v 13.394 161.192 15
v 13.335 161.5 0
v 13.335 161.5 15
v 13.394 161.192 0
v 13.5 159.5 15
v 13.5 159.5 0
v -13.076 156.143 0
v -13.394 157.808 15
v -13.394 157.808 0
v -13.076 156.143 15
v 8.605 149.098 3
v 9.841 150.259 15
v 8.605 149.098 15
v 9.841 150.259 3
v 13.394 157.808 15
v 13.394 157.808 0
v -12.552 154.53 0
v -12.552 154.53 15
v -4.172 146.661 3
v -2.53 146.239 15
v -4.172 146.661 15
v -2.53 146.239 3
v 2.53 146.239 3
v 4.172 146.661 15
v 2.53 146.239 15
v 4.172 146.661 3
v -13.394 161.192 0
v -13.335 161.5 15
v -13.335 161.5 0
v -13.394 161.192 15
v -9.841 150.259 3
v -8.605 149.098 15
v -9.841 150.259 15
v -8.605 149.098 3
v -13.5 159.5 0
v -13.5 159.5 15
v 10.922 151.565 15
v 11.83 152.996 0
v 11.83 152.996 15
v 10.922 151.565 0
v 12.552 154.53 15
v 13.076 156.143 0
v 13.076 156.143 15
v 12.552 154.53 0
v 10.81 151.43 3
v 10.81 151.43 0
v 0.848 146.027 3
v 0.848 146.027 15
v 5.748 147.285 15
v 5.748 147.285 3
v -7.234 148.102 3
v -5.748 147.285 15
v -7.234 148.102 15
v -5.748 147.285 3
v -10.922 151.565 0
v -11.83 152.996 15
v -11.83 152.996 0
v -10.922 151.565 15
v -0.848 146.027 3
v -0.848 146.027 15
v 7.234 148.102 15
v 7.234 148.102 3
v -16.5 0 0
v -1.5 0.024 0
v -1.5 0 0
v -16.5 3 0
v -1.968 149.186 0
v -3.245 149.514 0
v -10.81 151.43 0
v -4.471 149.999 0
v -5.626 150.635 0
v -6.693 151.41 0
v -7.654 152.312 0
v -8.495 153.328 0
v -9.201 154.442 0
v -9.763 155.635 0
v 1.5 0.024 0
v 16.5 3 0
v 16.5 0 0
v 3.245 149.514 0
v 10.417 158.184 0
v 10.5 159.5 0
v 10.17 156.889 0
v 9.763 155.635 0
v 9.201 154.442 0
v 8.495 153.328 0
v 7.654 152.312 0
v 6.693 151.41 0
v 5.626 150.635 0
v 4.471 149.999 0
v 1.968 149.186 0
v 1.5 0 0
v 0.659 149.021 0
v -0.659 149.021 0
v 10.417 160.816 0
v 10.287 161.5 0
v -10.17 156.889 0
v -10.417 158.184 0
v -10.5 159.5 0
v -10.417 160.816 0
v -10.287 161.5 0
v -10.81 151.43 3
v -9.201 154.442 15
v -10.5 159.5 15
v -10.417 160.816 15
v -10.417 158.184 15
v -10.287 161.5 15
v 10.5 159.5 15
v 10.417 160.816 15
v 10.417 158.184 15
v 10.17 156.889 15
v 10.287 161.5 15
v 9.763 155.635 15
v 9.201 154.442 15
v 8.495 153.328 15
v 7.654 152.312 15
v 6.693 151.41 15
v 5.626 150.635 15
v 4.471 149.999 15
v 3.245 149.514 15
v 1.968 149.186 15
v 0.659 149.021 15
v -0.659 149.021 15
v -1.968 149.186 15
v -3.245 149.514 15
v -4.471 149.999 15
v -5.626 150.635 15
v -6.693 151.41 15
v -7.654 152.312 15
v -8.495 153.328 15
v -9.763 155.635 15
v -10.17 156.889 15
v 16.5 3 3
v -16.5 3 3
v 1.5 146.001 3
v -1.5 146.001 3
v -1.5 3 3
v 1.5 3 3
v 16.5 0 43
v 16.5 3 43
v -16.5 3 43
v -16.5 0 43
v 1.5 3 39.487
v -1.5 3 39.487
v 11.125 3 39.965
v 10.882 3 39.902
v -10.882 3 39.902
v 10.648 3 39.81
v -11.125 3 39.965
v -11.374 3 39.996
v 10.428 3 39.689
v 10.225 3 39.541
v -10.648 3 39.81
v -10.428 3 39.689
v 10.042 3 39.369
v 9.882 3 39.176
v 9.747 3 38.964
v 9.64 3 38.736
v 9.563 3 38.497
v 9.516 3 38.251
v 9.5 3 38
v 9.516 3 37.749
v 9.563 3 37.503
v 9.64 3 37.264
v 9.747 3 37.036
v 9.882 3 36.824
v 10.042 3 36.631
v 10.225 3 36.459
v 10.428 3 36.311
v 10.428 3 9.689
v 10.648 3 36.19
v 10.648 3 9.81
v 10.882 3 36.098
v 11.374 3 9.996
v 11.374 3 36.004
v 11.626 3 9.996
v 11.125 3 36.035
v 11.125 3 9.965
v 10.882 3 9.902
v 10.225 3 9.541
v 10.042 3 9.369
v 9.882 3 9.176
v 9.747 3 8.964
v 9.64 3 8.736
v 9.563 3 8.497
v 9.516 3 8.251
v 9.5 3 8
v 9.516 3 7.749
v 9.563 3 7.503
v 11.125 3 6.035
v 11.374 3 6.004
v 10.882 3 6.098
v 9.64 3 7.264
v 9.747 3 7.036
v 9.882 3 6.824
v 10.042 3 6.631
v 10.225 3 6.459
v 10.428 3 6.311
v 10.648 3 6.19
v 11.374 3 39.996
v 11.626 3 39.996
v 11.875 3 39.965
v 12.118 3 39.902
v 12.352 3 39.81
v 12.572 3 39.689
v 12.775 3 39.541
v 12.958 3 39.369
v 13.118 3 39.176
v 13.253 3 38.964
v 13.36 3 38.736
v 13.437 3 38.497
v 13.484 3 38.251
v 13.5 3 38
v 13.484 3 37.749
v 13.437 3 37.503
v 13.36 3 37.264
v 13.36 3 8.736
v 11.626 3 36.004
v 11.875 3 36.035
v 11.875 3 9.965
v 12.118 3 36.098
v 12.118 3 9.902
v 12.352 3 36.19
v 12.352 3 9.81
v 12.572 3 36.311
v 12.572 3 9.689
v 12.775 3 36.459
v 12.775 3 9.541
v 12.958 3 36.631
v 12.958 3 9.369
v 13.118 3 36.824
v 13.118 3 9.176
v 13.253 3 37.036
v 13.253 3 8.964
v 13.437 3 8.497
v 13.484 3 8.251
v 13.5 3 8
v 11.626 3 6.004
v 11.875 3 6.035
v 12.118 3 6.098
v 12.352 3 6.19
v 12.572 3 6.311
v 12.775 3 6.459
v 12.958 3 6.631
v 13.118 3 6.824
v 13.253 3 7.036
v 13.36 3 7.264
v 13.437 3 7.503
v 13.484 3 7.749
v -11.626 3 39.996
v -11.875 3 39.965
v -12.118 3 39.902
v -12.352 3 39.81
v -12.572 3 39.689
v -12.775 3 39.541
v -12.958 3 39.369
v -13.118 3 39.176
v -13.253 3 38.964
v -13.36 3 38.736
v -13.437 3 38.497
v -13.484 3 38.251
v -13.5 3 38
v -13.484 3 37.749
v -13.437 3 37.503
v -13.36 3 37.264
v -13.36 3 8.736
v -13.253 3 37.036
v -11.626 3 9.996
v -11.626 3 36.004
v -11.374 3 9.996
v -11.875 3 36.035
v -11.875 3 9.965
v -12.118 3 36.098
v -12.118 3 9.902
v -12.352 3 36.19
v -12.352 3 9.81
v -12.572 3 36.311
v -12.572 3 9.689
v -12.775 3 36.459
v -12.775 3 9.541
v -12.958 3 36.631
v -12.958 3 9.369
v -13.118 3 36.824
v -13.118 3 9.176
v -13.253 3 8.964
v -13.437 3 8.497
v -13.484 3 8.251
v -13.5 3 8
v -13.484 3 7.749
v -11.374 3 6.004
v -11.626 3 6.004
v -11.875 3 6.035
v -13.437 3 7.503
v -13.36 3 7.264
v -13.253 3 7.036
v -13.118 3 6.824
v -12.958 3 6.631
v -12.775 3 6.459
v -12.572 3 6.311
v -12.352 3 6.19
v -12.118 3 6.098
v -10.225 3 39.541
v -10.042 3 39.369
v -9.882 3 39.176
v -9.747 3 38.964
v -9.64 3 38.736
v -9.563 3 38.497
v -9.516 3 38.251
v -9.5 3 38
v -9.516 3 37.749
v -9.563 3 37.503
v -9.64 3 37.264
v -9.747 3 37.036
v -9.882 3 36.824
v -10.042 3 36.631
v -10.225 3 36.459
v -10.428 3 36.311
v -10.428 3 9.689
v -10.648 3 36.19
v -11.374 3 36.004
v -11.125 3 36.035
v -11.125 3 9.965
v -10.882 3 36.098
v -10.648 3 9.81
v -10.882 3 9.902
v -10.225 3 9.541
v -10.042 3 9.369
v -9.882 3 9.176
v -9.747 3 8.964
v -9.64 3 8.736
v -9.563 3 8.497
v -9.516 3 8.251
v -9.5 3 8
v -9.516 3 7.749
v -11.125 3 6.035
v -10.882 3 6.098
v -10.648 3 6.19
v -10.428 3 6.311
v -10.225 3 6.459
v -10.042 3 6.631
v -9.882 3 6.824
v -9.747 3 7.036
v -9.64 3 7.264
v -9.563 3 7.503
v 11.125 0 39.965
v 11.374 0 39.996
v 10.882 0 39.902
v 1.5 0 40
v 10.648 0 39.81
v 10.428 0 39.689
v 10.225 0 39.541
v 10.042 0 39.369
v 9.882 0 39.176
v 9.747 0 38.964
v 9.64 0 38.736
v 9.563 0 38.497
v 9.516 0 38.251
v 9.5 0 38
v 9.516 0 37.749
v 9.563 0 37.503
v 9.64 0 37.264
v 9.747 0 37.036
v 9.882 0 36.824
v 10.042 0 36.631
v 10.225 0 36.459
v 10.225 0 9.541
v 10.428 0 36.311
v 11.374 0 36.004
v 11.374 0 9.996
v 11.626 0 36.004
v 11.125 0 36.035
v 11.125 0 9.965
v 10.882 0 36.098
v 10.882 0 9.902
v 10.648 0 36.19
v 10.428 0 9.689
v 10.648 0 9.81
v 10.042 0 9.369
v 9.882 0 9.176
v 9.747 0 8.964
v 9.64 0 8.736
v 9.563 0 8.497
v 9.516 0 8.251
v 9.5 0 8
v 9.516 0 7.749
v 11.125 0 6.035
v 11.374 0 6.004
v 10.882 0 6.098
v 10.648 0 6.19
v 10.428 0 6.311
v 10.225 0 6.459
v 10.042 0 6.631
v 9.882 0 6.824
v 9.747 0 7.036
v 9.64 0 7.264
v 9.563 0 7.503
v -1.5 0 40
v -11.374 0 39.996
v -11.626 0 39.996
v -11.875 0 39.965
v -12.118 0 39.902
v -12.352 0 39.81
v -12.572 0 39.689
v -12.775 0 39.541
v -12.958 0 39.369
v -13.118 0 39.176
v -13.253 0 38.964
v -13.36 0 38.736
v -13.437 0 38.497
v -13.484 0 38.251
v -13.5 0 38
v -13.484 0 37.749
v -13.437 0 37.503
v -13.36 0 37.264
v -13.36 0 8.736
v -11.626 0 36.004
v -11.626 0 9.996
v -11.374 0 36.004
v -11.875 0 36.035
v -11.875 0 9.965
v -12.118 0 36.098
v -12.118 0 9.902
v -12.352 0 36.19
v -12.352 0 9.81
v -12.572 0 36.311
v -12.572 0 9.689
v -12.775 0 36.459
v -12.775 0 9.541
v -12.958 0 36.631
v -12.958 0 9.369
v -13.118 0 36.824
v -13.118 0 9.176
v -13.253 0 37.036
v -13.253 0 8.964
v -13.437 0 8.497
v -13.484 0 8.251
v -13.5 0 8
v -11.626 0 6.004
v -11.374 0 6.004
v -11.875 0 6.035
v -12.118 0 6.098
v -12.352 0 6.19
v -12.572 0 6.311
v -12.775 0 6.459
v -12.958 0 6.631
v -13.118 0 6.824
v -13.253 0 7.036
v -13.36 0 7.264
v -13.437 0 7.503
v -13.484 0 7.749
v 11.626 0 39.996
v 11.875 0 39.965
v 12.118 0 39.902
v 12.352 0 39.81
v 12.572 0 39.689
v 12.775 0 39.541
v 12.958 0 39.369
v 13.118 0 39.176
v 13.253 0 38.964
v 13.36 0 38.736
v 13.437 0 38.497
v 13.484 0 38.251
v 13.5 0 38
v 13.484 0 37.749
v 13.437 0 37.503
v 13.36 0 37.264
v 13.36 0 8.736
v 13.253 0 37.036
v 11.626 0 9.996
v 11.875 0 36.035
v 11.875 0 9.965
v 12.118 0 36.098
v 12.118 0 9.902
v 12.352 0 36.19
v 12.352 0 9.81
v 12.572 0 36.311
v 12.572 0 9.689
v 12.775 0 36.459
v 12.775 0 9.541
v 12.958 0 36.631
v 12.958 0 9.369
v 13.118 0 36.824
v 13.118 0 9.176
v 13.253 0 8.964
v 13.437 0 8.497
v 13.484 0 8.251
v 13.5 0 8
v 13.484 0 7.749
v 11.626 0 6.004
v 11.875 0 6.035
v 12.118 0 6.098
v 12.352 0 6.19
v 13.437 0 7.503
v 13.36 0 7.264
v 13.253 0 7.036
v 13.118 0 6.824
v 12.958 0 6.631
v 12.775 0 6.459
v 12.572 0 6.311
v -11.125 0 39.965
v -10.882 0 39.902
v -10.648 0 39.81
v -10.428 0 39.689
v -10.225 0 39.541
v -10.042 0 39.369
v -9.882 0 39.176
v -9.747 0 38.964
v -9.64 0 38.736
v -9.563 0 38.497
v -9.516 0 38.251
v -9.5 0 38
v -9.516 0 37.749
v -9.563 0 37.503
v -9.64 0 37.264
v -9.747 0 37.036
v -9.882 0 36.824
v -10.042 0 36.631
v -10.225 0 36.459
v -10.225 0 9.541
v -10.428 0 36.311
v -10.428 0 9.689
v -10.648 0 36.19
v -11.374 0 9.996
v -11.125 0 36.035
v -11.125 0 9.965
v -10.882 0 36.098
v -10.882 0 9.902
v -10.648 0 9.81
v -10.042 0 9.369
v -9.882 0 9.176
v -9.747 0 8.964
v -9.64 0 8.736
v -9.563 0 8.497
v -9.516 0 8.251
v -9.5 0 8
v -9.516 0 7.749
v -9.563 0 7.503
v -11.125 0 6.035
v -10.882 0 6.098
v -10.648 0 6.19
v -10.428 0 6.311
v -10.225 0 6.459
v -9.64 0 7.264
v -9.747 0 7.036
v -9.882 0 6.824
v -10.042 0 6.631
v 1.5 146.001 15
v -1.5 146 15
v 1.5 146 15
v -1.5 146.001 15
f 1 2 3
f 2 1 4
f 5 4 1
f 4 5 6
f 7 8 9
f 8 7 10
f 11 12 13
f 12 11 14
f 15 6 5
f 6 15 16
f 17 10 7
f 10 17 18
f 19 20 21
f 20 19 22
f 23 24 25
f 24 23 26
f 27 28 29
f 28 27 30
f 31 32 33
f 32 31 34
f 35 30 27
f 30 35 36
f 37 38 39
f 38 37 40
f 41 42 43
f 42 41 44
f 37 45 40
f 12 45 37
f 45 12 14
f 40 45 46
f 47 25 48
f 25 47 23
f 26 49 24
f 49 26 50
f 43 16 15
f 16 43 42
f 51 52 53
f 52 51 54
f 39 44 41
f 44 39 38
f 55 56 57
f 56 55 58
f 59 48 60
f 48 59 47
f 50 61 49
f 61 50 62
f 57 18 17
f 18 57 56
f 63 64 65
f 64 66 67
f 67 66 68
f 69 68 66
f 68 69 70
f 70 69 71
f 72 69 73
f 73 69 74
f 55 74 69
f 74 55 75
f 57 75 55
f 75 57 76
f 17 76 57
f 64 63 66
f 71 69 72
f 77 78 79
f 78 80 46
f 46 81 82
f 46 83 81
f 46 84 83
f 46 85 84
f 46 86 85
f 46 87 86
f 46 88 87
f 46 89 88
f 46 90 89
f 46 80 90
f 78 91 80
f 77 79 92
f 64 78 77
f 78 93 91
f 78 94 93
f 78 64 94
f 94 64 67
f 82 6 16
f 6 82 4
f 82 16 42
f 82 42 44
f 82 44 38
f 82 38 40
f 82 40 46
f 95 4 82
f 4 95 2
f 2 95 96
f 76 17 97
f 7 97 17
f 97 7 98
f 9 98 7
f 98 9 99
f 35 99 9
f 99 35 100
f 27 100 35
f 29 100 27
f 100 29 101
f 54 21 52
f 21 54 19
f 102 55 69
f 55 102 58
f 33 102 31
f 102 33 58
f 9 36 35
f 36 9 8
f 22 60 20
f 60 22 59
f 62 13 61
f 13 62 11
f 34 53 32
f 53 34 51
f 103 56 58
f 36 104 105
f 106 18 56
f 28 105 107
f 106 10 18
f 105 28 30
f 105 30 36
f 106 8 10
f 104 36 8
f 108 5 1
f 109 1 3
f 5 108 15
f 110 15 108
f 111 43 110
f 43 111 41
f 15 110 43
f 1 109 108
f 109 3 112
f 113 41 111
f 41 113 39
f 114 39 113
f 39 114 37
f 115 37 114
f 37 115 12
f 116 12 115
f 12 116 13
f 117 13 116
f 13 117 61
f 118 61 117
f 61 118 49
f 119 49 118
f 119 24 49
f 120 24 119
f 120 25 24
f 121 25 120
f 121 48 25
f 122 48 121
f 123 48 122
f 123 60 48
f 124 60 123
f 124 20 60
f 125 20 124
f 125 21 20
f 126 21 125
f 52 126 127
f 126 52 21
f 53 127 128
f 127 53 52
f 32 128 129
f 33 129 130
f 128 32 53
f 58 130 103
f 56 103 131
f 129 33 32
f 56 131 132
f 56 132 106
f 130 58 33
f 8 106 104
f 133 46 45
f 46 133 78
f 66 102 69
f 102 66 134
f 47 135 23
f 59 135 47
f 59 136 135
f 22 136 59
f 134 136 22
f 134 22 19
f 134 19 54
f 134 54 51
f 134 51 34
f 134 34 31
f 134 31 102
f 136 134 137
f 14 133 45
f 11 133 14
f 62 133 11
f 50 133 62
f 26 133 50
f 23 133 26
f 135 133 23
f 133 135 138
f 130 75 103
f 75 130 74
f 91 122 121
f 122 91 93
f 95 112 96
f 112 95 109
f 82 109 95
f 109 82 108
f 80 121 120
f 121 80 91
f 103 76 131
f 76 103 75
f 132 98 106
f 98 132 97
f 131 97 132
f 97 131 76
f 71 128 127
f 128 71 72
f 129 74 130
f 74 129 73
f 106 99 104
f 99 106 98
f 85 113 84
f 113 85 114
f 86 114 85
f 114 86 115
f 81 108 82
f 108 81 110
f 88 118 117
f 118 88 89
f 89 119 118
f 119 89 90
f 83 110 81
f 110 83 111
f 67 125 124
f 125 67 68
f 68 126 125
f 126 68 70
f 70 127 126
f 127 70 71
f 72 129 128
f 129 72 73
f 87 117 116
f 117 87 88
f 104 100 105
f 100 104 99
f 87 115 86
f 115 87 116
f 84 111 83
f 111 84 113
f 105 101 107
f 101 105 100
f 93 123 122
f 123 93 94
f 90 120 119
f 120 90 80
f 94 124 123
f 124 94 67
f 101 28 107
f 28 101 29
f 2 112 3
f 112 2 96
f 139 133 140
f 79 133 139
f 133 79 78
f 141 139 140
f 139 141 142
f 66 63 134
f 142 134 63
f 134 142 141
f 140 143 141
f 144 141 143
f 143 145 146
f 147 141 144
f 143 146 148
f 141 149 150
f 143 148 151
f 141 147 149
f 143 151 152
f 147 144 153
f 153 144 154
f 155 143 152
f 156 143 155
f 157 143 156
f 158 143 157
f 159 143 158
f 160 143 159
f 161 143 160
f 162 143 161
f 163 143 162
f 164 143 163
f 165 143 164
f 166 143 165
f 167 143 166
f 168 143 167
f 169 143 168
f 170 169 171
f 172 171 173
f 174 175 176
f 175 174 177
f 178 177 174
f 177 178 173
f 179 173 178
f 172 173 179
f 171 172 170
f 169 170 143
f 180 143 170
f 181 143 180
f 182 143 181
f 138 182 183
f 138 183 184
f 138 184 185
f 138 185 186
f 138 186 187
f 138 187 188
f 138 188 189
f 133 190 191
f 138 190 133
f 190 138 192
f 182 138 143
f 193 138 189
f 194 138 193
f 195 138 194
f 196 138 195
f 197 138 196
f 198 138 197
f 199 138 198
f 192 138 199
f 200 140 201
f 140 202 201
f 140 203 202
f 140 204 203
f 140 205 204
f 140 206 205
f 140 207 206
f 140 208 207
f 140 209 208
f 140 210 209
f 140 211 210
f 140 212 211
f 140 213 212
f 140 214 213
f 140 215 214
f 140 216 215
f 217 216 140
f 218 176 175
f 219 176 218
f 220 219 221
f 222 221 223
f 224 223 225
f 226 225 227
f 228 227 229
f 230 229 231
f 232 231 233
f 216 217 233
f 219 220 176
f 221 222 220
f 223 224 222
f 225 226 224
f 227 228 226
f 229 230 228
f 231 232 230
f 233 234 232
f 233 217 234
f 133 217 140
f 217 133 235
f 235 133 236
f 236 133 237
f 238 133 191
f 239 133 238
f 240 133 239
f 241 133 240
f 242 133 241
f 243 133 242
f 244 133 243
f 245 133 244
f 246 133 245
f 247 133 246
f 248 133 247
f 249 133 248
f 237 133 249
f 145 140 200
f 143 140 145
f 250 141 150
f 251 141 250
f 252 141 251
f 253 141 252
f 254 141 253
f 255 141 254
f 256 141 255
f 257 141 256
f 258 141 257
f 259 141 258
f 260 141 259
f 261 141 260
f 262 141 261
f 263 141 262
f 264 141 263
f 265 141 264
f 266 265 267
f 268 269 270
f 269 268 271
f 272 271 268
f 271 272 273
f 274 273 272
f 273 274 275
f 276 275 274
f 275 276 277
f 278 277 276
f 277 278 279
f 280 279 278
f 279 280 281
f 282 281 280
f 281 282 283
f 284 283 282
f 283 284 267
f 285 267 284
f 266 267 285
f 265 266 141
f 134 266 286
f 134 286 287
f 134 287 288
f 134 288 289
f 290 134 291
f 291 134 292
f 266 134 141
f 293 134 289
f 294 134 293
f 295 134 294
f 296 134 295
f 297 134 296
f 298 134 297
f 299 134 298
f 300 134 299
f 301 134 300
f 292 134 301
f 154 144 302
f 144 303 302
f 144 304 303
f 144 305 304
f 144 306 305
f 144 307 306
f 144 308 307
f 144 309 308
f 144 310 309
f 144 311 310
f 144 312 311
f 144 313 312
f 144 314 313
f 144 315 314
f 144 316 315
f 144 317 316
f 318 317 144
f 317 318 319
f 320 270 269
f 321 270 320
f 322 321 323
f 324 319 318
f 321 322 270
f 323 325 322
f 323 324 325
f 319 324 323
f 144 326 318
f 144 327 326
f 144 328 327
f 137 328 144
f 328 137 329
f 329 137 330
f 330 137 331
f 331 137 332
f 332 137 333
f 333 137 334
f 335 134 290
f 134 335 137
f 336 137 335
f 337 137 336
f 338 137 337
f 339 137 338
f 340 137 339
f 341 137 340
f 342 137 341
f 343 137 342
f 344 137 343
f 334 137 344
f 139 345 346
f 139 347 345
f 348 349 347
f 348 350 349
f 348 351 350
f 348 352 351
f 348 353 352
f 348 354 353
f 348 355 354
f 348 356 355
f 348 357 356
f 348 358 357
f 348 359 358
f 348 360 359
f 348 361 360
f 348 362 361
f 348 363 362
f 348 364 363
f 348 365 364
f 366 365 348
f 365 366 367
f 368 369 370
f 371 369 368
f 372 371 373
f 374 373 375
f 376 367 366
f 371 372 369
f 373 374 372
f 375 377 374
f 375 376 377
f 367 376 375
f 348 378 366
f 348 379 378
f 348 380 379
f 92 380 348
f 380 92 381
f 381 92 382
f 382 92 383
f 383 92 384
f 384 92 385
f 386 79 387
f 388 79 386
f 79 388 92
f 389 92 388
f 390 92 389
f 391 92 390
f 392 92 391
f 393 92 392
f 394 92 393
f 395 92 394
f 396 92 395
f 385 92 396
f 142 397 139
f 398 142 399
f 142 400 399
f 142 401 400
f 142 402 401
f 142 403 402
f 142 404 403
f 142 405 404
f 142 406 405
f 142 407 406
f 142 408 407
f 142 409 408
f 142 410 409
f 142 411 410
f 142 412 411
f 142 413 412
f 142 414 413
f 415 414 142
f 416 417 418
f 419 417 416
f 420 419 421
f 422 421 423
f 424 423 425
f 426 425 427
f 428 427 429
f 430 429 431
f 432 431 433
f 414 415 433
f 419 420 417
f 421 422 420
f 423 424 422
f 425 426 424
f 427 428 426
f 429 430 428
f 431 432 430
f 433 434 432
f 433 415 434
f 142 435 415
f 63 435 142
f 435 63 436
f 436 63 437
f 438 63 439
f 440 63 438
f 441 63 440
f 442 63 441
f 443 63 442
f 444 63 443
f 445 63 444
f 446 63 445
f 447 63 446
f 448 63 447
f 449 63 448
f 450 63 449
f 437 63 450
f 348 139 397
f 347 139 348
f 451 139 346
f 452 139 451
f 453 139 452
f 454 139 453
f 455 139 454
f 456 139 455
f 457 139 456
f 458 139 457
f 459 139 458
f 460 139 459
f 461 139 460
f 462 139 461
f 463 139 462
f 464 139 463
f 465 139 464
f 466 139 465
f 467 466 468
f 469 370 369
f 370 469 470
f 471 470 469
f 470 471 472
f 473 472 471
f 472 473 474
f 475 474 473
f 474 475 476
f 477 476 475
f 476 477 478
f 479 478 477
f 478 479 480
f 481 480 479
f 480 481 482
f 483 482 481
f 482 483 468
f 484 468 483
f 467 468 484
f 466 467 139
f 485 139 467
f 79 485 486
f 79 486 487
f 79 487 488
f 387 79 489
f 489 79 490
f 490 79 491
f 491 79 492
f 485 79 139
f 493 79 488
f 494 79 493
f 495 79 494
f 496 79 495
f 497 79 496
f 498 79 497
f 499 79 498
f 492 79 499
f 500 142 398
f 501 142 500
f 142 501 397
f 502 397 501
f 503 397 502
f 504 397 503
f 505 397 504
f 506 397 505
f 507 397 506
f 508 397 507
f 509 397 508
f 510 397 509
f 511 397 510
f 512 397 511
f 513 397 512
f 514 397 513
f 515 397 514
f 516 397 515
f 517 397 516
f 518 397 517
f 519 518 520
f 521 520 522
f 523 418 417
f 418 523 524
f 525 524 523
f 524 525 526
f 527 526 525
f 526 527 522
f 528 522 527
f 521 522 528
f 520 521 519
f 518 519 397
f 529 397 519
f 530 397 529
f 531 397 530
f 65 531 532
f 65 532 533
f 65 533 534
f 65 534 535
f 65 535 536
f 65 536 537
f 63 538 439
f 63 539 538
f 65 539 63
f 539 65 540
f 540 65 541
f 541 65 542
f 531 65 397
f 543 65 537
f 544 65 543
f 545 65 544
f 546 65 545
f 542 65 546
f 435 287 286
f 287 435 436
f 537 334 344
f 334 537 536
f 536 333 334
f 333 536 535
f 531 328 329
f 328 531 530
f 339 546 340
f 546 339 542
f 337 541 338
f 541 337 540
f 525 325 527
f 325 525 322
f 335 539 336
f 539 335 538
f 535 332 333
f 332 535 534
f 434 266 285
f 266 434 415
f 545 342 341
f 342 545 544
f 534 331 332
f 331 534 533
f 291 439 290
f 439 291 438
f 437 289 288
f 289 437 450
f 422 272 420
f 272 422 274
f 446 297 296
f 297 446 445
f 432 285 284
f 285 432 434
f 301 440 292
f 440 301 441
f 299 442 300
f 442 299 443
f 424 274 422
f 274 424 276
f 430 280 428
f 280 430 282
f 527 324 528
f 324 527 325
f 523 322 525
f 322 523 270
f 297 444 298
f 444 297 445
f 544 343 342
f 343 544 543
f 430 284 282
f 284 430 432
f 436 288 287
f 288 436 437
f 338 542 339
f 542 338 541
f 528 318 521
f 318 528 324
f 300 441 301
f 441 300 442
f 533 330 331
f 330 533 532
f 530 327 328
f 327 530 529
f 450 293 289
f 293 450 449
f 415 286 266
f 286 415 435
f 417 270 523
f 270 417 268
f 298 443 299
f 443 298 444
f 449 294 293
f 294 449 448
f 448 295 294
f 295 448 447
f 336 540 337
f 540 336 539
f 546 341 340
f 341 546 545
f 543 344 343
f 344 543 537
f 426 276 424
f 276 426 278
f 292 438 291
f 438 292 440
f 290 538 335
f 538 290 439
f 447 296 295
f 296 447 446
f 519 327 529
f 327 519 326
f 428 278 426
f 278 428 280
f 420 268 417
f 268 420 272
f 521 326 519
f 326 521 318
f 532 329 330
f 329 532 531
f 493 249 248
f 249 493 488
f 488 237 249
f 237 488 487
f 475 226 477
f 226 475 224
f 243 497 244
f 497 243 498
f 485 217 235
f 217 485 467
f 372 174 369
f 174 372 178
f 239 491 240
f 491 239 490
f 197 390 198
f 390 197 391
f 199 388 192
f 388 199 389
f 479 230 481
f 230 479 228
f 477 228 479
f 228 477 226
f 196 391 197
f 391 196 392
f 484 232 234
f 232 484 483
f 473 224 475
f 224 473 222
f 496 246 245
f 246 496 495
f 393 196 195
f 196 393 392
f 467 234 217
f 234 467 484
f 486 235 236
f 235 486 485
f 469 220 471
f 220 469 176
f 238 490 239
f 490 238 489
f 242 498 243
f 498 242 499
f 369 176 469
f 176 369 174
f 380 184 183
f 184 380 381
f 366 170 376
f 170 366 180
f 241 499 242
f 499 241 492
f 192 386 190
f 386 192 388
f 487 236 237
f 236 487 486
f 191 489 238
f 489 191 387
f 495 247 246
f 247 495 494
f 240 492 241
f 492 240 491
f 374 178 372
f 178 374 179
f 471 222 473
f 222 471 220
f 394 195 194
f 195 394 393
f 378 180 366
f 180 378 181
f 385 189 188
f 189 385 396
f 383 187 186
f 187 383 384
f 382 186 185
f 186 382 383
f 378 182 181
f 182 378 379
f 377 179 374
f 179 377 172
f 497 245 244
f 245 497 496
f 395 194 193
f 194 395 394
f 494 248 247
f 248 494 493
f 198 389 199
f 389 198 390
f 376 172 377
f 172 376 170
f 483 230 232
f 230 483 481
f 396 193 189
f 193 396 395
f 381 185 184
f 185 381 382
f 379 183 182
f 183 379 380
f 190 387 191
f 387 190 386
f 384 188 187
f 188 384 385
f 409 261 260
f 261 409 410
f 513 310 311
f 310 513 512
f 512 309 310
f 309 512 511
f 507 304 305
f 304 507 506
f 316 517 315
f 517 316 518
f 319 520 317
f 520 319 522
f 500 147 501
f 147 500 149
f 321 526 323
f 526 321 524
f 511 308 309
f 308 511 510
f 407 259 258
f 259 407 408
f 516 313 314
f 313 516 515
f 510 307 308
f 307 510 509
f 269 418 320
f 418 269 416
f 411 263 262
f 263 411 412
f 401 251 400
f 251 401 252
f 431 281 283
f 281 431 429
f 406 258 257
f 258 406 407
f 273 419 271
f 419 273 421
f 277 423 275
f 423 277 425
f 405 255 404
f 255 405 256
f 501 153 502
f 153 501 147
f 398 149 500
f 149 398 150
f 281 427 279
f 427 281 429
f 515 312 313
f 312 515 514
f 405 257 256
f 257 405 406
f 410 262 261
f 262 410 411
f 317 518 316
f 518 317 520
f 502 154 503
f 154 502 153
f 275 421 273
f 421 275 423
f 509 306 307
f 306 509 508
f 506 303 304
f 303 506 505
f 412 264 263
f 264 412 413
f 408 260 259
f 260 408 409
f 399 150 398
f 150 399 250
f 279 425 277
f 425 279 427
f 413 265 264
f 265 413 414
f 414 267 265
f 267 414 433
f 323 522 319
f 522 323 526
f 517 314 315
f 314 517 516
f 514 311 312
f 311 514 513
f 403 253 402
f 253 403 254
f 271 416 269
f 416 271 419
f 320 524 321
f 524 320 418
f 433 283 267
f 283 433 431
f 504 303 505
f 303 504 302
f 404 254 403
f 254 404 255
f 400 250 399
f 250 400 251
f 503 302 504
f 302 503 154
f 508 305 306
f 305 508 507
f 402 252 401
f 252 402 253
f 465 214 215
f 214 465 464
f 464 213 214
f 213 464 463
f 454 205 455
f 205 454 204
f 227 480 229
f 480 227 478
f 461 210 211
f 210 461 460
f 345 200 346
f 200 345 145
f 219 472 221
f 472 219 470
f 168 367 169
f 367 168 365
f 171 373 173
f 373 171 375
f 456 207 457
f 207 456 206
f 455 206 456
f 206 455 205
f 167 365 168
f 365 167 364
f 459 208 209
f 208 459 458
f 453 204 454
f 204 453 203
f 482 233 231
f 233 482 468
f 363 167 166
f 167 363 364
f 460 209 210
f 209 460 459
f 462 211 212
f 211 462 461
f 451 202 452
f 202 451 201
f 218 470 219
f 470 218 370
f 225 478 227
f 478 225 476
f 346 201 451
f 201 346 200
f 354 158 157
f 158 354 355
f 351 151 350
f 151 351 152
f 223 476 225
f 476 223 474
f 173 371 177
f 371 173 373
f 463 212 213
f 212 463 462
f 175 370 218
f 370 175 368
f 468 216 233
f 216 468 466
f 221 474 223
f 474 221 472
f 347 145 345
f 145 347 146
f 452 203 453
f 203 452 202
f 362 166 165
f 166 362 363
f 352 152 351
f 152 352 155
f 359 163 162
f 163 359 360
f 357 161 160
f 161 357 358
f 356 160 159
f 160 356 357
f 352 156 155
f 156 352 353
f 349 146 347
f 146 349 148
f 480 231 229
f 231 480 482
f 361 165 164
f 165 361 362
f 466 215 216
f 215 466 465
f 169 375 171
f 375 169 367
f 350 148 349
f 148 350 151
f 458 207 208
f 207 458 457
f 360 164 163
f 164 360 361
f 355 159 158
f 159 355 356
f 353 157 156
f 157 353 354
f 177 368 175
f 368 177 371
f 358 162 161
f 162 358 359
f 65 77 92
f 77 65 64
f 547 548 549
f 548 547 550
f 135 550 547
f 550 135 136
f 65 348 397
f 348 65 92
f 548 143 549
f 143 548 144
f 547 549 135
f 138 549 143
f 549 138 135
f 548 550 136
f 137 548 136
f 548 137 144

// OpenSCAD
$fn=50;
half_pipe_dia=21;
half_pipe_wall=3;
pipe_height = 170;

difference()
{
    union()
    {
        translate([0,pipe_height - half_pipe_dia*0.5,0])
            cylinder(d=half_pipe_dia + half_pipe_wall *2, h=15);
        hull()
        {
            translate([-16.5,3,0])
                cylinder(d=0.001,h=3);
            translate([16.5,3,0])
                cylinder(d=0.001,h=3);
            translate([half_pipe_dia * 0.5 ,pipe_height - half_pipe_dia*0.5,0])
                cylinder(d=0.001,h=3);
            translate([half_pipe_dia * -0.5 ,pipe_height - half_pipe_dia*0.5,0])
                cylinder(d=0.001,h=3);
        }
    }
    translate([0,pipe_height - half_pipe_dia*0.5,-0.001])
        cylinder(d=half_pipe_dia, h=15.002);
    translate([(half_pipe_dia + half_pipe_wall *2 ) * -0.5 - 0.001,pipe_height - half_pipe_dia*0.5 +2 ,-0.001])
        cube([half_pipe_dia + half_pipe_wall * 2+ 0.002,(half_pipe_dia + half_pipe_wall * 2) * +0.5 + 0.001,15.002]);
}

difference()
{
    translate([-16.5,0,0])
        cube([33,3,43]);
    translate([-11.5,-0.001,8])
        rotate([-90,0,0])
            cylinder(d=4,h=3.002);
    translate([11.5,-0.001,8])
        rotate([-90,0,0])
            cylinder(d=4,h=3.002);
    translate([-11.5,-0.001,38])
        rotate([-90,0,0])
            cylinder(d=4,h=3.002);
    translate([11.5,-0.001,38])
        rotate([-90,0,0])
            cylinder(d=4,h=3.002);
}

hull()
{
    translate([-1.5,0,0])
        rotate([0,90,0])
            cylinder(d=0.001,h=3);
    translate([-1.5,0,40])
        rotate([0,90,0])
            cylinder(d=0.001,h=3);
    translate([-1.5,pipe_height-half_pipe_dia-half_pipe_wall,15])
        rotate([0,90,0])
            cylinder(d=0.001,h=3);
    translate([-1.5,pipe_height-half_pipe_dia-half_pipe_wall,3])
        rotate([0,90,0])
            cylinder(d=0.001,h=3);
}
